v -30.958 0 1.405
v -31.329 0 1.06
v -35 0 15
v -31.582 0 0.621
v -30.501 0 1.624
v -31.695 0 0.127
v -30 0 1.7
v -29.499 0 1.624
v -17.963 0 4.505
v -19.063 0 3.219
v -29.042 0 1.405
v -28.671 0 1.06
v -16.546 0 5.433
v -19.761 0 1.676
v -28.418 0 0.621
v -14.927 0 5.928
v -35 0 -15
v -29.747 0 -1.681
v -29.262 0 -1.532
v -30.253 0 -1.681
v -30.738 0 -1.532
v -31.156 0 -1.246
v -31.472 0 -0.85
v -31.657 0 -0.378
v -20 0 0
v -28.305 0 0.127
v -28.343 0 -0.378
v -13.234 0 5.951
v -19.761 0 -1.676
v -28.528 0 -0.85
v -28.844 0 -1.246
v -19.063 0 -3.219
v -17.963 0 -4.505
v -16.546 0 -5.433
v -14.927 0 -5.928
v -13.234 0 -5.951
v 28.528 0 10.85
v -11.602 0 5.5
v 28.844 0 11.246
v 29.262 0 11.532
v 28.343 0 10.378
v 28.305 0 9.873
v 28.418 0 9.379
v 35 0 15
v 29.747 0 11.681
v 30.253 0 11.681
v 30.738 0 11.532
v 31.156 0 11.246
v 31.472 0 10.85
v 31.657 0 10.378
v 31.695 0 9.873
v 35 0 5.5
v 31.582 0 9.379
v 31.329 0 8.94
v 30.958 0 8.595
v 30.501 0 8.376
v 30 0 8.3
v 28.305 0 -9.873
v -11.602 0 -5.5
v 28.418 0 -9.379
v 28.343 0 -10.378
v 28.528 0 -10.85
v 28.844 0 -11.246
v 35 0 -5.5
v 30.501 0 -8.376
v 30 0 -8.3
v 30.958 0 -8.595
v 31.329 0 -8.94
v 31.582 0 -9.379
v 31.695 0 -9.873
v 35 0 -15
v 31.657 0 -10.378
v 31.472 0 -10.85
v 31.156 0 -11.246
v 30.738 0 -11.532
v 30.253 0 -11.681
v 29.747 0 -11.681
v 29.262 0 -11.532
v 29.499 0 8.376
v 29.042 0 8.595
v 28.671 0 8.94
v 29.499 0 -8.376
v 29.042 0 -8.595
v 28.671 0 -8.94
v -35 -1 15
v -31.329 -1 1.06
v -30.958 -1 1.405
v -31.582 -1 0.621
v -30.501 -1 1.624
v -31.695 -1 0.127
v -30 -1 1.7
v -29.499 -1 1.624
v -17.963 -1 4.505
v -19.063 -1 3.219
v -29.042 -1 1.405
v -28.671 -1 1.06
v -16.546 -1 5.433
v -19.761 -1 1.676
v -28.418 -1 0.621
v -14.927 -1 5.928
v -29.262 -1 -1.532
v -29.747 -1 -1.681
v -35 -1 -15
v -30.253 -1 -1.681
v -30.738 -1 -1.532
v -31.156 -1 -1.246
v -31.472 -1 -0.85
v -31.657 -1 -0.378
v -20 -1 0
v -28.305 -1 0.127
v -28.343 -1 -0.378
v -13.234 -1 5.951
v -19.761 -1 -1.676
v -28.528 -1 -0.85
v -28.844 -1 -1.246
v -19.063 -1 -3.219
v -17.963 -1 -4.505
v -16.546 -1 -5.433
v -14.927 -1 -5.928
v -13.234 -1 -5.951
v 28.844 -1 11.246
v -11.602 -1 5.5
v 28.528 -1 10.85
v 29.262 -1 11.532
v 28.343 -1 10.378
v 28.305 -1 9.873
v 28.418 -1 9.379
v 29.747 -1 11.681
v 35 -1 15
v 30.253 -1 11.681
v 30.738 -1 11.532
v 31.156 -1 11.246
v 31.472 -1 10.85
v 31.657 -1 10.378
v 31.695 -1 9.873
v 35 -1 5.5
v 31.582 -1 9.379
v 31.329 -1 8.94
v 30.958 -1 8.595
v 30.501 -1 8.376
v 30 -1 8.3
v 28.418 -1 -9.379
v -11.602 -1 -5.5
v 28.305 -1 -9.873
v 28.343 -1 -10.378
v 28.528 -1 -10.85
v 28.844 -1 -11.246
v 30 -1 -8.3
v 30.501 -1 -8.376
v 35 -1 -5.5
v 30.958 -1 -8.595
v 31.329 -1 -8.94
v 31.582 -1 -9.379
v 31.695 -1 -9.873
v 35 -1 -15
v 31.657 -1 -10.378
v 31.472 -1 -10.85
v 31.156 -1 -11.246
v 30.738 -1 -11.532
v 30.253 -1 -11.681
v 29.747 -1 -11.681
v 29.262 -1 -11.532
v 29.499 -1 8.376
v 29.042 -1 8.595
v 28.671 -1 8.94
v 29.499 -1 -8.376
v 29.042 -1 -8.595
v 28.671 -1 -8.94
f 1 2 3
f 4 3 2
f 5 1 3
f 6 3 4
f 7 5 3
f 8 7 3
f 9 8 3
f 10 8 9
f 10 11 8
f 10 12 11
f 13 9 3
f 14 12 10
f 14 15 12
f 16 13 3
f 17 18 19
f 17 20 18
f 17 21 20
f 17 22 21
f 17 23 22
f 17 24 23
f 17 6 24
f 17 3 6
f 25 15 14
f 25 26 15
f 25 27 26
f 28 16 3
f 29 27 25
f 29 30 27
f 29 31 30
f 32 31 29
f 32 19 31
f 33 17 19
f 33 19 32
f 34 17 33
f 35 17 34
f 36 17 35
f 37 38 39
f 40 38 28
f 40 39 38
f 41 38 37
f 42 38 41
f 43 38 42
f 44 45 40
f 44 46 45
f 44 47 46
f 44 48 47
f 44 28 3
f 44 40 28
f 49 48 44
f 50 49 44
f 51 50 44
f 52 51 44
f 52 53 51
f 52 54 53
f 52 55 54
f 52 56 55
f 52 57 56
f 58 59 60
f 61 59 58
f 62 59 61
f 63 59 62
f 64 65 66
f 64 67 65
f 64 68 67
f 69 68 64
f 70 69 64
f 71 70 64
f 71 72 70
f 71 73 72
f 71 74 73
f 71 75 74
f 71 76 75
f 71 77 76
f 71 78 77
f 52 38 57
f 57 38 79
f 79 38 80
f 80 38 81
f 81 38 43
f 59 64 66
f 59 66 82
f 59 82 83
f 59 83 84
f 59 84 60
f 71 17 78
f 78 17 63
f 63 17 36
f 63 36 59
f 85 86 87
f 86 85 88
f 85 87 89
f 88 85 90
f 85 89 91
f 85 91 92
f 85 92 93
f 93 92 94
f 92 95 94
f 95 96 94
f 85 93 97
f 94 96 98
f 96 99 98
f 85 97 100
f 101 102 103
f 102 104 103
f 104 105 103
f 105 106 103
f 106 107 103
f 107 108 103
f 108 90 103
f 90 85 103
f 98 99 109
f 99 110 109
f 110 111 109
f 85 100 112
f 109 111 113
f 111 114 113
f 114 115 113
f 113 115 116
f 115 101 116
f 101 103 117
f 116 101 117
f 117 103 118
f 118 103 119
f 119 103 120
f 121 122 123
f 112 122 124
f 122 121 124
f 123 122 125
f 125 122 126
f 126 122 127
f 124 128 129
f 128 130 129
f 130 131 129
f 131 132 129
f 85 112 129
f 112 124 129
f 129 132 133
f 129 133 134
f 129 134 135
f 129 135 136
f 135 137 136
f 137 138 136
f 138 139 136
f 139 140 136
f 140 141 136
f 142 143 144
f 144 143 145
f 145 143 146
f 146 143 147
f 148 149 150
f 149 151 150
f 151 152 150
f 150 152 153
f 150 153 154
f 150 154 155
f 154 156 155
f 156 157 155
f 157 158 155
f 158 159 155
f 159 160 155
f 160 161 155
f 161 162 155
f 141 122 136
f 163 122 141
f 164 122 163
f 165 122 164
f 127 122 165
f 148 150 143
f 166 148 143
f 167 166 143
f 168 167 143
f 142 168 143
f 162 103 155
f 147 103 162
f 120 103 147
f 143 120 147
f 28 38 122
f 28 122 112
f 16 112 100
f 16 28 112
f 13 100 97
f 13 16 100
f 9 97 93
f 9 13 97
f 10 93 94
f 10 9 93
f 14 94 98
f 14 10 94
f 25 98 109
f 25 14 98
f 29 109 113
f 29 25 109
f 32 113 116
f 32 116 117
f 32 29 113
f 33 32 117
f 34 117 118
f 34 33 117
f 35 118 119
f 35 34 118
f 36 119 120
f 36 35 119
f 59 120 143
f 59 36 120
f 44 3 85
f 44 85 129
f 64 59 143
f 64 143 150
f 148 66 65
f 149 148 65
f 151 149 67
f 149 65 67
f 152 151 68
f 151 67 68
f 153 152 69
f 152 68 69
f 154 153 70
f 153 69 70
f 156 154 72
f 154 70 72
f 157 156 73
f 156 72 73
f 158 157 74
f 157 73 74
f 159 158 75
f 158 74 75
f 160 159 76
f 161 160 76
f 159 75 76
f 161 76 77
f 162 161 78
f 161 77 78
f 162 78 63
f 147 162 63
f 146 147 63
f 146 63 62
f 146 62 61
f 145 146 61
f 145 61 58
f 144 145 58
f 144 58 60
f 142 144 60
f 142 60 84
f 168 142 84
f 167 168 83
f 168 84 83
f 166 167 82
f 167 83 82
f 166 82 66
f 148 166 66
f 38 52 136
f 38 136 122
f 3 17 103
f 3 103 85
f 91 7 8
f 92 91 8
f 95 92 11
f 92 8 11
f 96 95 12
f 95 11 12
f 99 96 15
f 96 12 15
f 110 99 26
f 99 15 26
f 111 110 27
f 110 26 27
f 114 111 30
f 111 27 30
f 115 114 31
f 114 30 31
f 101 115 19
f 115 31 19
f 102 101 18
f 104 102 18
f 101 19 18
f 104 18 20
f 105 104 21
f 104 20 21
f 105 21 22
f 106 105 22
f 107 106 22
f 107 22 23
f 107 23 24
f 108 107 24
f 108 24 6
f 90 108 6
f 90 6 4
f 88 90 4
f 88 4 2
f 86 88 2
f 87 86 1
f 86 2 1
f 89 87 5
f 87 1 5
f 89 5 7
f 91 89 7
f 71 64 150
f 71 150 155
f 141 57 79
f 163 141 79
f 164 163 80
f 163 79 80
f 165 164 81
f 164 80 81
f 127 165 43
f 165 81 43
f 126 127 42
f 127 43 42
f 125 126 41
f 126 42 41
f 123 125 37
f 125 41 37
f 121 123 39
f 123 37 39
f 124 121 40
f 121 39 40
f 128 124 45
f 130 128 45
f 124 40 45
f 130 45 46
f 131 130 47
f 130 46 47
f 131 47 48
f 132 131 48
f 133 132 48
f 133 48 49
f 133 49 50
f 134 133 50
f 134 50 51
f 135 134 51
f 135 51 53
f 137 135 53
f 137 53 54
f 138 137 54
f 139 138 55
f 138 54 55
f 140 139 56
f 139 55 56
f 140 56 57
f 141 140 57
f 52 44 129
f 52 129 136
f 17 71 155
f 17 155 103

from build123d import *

# Parameters (mm, degrees)
ESQUISSE1_R               = 1.7
T_LE_DE_BASE_PLI_E1_DEPTH = 1


# Sheet-metal steps are written as plain solids
with BuildPart() as part:
    # Esquisse1 → Tôle de base pliée1 (new body)
    with BuildSketch(Plane(origin=(0, 0, 0), x_dir=(1, 0, 0), z_dir=(0, 1, 0))):
        with BuildLine():
            Line((-35, -15), (35, -15))
            Line((35, -15), (35, -5.5))
            Line((35, -5.5), (-11.602084238, -5.5))
            ThreePointArc((-11.602084238, -5.5), (-20, 0), (-11.602084238, 5.5))
            Line((-11.602084238, 5.5), (35, 5.5))
            Line((35, 5.5), (35, 15))
            Line((35, 15), (-35, 15))
            Line((-35, 15), (-35, -15))
        make_face()
        with Locations(Location((30, 10, 0), (0, 0, 270))):
            Circle(ESQUISSE1_R, mode=Mode.SUBTRACT)
        with Locations(Location((30, -10, 0), (0, 0, 90))):
            Circle(ESQUISSE1_R, mode=Mode.SUBTRACT)
        with Locations(Location((-30, 0, 0), (0, 0, 270))):
            Circle(ESQUISSE1_R, mode=Mode.SUBTRACT)
    extrude(amount=-T_LE_DE_BASE_PLI_E1_DEPTH)


solid = part.part
